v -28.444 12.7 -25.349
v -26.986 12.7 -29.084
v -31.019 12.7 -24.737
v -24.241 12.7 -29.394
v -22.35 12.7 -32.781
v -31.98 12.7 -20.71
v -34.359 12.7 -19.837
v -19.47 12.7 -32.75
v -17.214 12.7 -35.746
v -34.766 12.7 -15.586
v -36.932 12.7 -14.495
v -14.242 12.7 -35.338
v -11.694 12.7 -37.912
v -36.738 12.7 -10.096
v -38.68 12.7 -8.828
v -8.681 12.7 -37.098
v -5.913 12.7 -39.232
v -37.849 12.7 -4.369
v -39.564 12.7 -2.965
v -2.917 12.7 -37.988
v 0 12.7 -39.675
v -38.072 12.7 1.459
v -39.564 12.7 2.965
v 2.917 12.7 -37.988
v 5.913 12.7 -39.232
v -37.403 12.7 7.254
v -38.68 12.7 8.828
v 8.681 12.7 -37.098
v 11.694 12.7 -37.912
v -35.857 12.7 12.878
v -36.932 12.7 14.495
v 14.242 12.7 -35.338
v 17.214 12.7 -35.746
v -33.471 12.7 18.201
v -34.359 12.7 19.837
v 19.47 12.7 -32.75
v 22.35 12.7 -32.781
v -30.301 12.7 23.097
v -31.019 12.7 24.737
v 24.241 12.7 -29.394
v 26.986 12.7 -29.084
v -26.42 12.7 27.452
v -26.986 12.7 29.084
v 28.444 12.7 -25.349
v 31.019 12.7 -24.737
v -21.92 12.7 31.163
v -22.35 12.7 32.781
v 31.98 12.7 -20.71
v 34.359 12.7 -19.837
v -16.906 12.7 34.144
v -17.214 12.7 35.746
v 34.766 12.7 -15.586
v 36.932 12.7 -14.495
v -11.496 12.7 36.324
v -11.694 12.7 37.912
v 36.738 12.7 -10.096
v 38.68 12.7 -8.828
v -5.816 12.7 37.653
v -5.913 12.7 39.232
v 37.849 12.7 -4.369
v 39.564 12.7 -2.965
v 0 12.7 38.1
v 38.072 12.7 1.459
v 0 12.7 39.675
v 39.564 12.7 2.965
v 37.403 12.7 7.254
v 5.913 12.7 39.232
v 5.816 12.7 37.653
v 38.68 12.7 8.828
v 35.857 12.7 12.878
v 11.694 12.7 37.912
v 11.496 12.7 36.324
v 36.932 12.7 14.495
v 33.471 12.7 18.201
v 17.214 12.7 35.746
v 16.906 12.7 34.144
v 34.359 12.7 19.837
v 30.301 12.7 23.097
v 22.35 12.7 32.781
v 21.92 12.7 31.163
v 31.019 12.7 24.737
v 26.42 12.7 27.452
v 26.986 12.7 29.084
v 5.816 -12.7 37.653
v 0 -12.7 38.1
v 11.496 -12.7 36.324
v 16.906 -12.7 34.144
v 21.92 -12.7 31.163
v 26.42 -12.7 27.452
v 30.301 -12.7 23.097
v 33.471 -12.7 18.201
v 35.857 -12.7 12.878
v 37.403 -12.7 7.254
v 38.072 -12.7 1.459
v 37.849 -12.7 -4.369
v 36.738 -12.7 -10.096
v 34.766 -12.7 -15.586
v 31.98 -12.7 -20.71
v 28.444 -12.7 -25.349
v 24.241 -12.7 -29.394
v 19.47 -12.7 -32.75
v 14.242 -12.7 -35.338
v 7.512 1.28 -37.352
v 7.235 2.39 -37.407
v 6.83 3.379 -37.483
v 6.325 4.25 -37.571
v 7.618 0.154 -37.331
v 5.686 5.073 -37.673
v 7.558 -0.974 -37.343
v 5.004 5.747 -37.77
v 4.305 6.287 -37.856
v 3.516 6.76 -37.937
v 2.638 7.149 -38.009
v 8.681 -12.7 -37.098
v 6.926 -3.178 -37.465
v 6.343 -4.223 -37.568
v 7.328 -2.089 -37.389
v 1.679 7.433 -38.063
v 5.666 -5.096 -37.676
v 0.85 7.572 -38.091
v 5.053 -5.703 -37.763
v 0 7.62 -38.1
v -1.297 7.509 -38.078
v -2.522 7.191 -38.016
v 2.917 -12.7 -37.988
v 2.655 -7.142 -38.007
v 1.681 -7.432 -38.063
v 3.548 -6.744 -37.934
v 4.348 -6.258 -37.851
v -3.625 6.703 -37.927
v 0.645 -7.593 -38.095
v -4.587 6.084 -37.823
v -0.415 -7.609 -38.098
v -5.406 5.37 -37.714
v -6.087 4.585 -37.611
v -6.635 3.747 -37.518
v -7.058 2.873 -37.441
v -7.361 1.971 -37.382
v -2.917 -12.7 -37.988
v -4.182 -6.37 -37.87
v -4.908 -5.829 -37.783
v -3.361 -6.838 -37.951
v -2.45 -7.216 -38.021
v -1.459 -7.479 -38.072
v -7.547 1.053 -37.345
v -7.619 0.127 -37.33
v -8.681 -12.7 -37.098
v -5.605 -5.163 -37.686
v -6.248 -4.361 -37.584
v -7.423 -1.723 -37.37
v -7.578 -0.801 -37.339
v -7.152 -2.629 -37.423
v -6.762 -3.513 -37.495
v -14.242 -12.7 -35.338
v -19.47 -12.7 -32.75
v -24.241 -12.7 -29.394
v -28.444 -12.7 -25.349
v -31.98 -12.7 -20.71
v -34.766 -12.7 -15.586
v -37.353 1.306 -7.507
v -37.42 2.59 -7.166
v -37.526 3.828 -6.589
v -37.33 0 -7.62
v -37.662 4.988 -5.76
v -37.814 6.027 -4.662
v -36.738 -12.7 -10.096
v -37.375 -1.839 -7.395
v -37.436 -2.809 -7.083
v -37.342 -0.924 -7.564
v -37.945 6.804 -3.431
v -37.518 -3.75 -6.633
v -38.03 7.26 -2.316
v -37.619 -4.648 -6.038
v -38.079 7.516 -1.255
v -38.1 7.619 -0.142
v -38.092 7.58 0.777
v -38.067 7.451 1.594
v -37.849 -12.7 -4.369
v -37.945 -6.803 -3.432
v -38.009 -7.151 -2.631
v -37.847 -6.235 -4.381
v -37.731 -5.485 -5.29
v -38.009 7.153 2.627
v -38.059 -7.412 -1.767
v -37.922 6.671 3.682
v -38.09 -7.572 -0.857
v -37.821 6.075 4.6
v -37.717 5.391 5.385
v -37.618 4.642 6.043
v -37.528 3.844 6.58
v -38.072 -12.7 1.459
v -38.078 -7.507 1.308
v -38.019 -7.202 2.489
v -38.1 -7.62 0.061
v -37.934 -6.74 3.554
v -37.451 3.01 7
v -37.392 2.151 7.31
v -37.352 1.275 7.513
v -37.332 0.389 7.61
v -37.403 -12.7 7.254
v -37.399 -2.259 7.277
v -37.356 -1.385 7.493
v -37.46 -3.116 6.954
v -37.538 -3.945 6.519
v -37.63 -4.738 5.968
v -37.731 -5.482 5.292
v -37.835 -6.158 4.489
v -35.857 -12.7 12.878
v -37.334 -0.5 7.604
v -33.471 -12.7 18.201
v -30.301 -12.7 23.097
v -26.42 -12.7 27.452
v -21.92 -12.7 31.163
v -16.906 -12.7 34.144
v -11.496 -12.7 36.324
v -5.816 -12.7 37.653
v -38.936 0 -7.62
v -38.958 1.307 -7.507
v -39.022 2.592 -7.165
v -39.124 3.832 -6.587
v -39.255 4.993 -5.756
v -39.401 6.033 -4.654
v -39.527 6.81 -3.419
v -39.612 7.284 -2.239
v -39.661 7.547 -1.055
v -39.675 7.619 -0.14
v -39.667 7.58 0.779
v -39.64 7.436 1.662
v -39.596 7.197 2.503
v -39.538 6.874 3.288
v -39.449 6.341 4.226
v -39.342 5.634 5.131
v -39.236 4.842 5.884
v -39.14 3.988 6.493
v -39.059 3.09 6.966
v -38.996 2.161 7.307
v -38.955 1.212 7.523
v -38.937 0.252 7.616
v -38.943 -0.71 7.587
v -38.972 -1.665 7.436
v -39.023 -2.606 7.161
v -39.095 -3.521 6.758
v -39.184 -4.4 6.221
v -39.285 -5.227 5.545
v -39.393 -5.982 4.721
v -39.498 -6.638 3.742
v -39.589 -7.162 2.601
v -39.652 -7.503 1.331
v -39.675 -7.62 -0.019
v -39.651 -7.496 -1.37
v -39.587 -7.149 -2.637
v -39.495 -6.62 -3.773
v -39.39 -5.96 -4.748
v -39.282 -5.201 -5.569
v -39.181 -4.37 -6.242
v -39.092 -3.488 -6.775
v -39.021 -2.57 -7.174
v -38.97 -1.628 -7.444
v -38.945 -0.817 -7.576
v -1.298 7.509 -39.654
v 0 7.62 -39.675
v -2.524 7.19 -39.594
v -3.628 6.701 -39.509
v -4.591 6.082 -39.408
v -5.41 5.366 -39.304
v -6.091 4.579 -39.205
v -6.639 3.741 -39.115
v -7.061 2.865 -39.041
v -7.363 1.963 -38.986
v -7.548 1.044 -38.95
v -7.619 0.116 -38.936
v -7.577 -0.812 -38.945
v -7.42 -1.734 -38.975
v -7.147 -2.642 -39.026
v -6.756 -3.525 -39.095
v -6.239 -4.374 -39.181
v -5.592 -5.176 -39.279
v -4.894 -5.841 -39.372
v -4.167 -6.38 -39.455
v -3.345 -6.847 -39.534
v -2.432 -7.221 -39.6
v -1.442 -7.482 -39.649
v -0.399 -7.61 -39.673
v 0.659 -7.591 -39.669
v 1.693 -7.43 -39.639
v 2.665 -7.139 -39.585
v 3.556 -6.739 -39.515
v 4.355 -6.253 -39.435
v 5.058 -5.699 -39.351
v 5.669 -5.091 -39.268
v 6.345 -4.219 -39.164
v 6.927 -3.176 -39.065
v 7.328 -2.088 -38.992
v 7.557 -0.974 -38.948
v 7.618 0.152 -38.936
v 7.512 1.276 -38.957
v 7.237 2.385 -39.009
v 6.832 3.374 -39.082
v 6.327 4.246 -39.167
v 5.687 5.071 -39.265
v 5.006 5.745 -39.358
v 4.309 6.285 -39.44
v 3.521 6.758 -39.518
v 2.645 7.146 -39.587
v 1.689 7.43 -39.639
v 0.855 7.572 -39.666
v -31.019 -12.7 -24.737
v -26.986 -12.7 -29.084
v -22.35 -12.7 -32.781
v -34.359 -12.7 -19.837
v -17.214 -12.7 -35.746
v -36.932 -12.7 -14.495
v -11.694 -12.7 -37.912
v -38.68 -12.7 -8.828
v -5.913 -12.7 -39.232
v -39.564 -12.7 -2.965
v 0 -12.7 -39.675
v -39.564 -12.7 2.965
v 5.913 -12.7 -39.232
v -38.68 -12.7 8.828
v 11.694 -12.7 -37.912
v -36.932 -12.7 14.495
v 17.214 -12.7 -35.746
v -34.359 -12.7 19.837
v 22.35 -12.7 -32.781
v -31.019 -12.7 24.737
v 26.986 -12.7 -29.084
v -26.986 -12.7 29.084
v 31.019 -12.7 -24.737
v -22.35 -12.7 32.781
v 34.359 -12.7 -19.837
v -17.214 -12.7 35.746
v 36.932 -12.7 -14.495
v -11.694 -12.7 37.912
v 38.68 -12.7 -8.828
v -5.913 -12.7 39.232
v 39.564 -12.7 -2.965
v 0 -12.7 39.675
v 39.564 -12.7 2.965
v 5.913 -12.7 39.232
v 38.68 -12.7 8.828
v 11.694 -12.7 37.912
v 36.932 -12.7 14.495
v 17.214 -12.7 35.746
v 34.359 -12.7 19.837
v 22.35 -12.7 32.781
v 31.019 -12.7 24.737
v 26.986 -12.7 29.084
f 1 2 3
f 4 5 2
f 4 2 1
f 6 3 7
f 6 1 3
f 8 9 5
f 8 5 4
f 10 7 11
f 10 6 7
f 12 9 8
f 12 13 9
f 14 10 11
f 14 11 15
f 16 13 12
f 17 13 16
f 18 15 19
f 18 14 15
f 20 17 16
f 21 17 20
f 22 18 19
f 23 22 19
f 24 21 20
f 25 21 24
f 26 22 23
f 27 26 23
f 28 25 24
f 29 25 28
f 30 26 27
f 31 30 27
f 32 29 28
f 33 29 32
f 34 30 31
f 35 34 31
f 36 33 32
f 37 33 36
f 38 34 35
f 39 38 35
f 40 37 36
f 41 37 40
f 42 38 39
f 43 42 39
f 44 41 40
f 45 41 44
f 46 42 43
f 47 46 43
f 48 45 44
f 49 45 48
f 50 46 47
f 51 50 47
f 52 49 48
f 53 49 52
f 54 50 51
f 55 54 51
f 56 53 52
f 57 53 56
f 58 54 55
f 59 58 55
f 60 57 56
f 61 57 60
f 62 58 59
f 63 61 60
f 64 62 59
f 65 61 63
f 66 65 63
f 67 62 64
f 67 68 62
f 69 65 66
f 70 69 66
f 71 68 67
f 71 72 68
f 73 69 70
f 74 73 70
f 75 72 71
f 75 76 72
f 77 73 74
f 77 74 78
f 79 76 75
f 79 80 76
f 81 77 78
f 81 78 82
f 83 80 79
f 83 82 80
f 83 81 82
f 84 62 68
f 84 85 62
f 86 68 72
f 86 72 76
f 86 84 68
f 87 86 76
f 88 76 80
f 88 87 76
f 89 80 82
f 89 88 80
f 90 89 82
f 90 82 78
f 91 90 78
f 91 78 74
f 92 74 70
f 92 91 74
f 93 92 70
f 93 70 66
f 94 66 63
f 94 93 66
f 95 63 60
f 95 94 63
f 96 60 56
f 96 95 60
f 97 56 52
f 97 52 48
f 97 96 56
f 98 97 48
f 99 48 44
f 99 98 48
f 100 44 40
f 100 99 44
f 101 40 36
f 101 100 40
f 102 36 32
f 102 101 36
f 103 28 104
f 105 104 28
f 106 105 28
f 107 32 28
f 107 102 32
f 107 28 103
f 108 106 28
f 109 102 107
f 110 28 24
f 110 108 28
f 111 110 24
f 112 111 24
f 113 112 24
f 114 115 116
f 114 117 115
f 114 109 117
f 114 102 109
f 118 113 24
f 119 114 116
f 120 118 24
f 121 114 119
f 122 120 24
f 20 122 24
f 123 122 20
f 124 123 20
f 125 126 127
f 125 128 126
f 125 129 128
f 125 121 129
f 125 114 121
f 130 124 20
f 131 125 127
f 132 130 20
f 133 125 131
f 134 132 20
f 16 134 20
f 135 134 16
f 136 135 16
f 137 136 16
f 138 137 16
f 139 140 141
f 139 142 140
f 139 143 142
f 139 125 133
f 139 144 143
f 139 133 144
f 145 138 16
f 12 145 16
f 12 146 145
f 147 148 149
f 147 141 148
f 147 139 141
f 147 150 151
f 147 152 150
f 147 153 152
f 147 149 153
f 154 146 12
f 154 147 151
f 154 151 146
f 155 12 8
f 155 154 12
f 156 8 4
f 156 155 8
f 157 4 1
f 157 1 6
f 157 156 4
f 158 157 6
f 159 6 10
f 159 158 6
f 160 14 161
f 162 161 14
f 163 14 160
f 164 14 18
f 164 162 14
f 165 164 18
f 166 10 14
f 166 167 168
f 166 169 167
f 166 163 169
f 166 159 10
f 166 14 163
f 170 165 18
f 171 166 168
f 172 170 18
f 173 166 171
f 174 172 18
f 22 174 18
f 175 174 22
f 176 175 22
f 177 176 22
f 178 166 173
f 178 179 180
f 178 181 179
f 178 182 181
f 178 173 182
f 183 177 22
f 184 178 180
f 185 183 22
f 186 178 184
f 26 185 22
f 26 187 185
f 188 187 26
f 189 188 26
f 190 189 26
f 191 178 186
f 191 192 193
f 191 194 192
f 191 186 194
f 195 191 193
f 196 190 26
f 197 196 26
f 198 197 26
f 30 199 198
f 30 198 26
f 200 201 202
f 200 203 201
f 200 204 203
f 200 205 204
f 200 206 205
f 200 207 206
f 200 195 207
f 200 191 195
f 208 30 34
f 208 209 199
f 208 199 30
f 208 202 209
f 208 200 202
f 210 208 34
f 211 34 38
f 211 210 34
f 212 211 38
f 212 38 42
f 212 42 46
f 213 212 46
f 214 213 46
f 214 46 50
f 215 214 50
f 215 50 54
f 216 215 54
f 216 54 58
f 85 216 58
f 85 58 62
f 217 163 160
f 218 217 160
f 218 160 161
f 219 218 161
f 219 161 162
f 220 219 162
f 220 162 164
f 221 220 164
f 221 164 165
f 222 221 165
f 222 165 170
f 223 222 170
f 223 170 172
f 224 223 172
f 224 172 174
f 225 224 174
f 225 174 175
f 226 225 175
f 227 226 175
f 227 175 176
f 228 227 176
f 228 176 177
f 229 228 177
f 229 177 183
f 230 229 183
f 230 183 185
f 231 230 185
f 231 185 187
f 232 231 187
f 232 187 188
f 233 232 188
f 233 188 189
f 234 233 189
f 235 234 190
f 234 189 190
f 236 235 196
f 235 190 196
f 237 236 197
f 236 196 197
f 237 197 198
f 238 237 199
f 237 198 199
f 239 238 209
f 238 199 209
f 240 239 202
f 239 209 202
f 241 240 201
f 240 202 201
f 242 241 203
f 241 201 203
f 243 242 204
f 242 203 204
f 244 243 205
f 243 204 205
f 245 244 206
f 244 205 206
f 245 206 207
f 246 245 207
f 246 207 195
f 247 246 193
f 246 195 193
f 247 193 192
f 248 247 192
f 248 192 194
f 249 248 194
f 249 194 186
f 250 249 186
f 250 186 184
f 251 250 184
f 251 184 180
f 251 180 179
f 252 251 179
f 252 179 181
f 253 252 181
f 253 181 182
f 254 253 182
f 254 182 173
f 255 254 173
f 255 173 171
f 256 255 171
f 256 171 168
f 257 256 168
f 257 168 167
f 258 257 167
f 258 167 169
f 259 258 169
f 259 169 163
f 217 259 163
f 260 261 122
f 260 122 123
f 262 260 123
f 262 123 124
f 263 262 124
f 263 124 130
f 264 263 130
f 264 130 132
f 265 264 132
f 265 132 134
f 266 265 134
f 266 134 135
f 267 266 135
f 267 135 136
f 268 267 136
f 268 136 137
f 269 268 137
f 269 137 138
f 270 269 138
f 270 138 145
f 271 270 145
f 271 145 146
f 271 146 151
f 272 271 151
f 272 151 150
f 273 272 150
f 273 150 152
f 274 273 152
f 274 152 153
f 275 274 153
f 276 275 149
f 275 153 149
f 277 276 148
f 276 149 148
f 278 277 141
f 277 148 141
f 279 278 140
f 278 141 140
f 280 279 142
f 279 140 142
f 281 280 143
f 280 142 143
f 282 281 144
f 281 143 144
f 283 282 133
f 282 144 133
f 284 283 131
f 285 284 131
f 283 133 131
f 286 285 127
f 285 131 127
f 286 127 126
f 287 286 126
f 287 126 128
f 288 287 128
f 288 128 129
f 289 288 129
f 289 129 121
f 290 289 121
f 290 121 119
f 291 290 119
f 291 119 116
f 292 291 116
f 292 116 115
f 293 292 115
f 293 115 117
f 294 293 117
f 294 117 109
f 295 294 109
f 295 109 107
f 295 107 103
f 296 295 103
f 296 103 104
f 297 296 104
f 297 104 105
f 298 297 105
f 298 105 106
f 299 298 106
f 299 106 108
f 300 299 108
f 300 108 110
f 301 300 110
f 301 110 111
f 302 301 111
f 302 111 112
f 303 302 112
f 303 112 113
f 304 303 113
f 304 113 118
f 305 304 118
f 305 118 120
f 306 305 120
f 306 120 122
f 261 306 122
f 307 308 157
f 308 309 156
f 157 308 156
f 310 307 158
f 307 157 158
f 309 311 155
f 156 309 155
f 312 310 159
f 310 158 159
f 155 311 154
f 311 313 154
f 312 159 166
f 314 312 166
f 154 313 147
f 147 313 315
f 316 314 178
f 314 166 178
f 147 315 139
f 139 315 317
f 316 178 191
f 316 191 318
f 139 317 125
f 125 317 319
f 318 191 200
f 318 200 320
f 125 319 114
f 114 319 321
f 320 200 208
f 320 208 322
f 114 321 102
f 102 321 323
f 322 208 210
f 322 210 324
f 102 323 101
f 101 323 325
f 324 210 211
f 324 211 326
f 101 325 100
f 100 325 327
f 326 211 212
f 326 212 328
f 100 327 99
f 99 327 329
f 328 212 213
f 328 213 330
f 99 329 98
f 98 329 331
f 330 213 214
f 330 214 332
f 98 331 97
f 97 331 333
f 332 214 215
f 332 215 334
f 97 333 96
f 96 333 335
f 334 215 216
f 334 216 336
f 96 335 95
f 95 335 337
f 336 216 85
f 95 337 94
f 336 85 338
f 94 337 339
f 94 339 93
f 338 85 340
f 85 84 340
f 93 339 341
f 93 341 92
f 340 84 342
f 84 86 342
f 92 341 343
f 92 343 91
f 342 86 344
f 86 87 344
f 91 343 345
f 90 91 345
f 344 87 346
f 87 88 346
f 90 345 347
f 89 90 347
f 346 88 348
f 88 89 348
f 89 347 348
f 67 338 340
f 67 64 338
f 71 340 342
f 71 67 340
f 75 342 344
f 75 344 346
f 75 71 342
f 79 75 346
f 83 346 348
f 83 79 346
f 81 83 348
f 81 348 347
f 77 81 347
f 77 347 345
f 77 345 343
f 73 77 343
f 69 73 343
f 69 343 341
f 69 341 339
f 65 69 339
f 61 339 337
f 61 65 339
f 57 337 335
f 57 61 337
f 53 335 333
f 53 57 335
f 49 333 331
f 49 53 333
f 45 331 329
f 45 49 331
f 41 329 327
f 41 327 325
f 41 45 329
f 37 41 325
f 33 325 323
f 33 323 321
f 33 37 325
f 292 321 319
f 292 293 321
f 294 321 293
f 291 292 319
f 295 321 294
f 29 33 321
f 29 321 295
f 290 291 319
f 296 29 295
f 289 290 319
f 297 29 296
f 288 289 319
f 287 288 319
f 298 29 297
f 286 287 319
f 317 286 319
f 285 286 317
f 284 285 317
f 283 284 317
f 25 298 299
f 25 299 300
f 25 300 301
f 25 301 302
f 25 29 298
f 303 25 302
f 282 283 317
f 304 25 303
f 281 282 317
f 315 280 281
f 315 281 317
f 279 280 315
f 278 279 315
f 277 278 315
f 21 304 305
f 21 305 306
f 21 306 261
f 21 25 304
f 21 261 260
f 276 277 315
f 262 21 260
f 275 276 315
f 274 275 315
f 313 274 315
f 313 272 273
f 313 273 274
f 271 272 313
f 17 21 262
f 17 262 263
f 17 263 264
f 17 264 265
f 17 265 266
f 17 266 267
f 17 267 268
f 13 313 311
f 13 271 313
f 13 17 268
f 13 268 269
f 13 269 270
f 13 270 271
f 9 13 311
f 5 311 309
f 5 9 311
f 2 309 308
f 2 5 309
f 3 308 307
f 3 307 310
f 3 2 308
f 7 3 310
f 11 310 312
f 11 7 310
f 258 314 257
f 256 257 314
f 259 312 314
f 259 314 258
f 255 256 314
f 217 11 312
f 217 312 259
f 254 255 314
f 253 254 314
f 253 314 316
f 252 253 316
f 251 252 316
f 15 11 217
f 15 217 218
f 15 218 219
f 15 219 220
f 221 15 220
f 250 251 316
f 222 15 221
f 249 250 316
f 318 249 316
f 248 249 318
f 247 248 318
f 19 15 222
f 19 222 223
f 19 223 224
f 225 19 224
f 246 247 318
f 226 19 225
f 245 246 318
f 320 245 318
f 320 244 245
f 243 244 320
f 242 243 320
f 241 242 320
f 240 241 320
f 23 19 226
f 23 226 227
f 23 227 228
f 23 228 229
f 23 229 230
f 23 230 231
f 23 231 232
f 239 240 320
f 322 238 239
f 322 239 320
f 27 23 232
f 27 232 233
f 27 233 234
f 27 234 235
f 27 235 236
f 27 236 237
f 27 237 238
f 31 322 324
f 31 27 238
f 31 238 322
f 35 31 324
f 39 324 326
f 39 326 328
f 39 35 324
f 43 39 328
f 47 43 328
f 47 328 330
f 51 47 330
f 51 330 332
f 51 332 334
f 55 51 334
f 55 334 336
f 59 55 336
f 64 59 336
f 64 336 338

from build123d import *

# Parameters (mm, degrees)
SKETCH1_R           = 39.6748
SKETCH1_R_2         = 38.1
BOSS_EXTRUDE1_DEPTH = 12.7
SKETCH2_R           = 7.62
CUT_EXTRUDE1_DEPTH  = 58.527988928
SKETCH3_R           = 7.62
CUT_EXTRUDE2_DEPTH  = 58.527989088


with BuildPart() as part:
    # Sketch1 → Boss-Extrude1 (new, symmetric)
    with BuildSketch(Plane(origin=(0, 0, 0), x_dir=(1, 0, 0), z_dir=(0, 1, 0))):
        with Locations(Location((0, 0, 0), (0, 0, 270))):
            Circle(SKETCH1_R)
        with Locations(Location((0, 0, 0), (0, 0, 270))):
            Circle(SKETCH1_R_2, mode=Mode.SUBTRACT)
    extrude(amount=BOSS_EXTRUDE1_DEPTH, both=True)

    # Sketch2 → Cut-Extrude1 (cut, through all)
    with BuildSketch(Plane.XY):
        with Locations(Location((0, 0, 0), (0, 0, 90))):
            Circle(SKETCH2_R)
    extrude(amount=-CUT_EXTRUDE1_DEPTH, mode=Mode.SUBTRACT)

    # Sketch3 → Cut-Extrude2 (cut, through all)
    with BuildSketch(Plane(origin=(0, 0, 0), x_dir=(0, 0, -1), z_dir=(1, 0, 0))):
        Circle(SKETCH3_R)
    extrude(amount=-CUT_EXTRUDE2_DEPTH, mode=Mode.SUBTRACT)


solid = part.part
